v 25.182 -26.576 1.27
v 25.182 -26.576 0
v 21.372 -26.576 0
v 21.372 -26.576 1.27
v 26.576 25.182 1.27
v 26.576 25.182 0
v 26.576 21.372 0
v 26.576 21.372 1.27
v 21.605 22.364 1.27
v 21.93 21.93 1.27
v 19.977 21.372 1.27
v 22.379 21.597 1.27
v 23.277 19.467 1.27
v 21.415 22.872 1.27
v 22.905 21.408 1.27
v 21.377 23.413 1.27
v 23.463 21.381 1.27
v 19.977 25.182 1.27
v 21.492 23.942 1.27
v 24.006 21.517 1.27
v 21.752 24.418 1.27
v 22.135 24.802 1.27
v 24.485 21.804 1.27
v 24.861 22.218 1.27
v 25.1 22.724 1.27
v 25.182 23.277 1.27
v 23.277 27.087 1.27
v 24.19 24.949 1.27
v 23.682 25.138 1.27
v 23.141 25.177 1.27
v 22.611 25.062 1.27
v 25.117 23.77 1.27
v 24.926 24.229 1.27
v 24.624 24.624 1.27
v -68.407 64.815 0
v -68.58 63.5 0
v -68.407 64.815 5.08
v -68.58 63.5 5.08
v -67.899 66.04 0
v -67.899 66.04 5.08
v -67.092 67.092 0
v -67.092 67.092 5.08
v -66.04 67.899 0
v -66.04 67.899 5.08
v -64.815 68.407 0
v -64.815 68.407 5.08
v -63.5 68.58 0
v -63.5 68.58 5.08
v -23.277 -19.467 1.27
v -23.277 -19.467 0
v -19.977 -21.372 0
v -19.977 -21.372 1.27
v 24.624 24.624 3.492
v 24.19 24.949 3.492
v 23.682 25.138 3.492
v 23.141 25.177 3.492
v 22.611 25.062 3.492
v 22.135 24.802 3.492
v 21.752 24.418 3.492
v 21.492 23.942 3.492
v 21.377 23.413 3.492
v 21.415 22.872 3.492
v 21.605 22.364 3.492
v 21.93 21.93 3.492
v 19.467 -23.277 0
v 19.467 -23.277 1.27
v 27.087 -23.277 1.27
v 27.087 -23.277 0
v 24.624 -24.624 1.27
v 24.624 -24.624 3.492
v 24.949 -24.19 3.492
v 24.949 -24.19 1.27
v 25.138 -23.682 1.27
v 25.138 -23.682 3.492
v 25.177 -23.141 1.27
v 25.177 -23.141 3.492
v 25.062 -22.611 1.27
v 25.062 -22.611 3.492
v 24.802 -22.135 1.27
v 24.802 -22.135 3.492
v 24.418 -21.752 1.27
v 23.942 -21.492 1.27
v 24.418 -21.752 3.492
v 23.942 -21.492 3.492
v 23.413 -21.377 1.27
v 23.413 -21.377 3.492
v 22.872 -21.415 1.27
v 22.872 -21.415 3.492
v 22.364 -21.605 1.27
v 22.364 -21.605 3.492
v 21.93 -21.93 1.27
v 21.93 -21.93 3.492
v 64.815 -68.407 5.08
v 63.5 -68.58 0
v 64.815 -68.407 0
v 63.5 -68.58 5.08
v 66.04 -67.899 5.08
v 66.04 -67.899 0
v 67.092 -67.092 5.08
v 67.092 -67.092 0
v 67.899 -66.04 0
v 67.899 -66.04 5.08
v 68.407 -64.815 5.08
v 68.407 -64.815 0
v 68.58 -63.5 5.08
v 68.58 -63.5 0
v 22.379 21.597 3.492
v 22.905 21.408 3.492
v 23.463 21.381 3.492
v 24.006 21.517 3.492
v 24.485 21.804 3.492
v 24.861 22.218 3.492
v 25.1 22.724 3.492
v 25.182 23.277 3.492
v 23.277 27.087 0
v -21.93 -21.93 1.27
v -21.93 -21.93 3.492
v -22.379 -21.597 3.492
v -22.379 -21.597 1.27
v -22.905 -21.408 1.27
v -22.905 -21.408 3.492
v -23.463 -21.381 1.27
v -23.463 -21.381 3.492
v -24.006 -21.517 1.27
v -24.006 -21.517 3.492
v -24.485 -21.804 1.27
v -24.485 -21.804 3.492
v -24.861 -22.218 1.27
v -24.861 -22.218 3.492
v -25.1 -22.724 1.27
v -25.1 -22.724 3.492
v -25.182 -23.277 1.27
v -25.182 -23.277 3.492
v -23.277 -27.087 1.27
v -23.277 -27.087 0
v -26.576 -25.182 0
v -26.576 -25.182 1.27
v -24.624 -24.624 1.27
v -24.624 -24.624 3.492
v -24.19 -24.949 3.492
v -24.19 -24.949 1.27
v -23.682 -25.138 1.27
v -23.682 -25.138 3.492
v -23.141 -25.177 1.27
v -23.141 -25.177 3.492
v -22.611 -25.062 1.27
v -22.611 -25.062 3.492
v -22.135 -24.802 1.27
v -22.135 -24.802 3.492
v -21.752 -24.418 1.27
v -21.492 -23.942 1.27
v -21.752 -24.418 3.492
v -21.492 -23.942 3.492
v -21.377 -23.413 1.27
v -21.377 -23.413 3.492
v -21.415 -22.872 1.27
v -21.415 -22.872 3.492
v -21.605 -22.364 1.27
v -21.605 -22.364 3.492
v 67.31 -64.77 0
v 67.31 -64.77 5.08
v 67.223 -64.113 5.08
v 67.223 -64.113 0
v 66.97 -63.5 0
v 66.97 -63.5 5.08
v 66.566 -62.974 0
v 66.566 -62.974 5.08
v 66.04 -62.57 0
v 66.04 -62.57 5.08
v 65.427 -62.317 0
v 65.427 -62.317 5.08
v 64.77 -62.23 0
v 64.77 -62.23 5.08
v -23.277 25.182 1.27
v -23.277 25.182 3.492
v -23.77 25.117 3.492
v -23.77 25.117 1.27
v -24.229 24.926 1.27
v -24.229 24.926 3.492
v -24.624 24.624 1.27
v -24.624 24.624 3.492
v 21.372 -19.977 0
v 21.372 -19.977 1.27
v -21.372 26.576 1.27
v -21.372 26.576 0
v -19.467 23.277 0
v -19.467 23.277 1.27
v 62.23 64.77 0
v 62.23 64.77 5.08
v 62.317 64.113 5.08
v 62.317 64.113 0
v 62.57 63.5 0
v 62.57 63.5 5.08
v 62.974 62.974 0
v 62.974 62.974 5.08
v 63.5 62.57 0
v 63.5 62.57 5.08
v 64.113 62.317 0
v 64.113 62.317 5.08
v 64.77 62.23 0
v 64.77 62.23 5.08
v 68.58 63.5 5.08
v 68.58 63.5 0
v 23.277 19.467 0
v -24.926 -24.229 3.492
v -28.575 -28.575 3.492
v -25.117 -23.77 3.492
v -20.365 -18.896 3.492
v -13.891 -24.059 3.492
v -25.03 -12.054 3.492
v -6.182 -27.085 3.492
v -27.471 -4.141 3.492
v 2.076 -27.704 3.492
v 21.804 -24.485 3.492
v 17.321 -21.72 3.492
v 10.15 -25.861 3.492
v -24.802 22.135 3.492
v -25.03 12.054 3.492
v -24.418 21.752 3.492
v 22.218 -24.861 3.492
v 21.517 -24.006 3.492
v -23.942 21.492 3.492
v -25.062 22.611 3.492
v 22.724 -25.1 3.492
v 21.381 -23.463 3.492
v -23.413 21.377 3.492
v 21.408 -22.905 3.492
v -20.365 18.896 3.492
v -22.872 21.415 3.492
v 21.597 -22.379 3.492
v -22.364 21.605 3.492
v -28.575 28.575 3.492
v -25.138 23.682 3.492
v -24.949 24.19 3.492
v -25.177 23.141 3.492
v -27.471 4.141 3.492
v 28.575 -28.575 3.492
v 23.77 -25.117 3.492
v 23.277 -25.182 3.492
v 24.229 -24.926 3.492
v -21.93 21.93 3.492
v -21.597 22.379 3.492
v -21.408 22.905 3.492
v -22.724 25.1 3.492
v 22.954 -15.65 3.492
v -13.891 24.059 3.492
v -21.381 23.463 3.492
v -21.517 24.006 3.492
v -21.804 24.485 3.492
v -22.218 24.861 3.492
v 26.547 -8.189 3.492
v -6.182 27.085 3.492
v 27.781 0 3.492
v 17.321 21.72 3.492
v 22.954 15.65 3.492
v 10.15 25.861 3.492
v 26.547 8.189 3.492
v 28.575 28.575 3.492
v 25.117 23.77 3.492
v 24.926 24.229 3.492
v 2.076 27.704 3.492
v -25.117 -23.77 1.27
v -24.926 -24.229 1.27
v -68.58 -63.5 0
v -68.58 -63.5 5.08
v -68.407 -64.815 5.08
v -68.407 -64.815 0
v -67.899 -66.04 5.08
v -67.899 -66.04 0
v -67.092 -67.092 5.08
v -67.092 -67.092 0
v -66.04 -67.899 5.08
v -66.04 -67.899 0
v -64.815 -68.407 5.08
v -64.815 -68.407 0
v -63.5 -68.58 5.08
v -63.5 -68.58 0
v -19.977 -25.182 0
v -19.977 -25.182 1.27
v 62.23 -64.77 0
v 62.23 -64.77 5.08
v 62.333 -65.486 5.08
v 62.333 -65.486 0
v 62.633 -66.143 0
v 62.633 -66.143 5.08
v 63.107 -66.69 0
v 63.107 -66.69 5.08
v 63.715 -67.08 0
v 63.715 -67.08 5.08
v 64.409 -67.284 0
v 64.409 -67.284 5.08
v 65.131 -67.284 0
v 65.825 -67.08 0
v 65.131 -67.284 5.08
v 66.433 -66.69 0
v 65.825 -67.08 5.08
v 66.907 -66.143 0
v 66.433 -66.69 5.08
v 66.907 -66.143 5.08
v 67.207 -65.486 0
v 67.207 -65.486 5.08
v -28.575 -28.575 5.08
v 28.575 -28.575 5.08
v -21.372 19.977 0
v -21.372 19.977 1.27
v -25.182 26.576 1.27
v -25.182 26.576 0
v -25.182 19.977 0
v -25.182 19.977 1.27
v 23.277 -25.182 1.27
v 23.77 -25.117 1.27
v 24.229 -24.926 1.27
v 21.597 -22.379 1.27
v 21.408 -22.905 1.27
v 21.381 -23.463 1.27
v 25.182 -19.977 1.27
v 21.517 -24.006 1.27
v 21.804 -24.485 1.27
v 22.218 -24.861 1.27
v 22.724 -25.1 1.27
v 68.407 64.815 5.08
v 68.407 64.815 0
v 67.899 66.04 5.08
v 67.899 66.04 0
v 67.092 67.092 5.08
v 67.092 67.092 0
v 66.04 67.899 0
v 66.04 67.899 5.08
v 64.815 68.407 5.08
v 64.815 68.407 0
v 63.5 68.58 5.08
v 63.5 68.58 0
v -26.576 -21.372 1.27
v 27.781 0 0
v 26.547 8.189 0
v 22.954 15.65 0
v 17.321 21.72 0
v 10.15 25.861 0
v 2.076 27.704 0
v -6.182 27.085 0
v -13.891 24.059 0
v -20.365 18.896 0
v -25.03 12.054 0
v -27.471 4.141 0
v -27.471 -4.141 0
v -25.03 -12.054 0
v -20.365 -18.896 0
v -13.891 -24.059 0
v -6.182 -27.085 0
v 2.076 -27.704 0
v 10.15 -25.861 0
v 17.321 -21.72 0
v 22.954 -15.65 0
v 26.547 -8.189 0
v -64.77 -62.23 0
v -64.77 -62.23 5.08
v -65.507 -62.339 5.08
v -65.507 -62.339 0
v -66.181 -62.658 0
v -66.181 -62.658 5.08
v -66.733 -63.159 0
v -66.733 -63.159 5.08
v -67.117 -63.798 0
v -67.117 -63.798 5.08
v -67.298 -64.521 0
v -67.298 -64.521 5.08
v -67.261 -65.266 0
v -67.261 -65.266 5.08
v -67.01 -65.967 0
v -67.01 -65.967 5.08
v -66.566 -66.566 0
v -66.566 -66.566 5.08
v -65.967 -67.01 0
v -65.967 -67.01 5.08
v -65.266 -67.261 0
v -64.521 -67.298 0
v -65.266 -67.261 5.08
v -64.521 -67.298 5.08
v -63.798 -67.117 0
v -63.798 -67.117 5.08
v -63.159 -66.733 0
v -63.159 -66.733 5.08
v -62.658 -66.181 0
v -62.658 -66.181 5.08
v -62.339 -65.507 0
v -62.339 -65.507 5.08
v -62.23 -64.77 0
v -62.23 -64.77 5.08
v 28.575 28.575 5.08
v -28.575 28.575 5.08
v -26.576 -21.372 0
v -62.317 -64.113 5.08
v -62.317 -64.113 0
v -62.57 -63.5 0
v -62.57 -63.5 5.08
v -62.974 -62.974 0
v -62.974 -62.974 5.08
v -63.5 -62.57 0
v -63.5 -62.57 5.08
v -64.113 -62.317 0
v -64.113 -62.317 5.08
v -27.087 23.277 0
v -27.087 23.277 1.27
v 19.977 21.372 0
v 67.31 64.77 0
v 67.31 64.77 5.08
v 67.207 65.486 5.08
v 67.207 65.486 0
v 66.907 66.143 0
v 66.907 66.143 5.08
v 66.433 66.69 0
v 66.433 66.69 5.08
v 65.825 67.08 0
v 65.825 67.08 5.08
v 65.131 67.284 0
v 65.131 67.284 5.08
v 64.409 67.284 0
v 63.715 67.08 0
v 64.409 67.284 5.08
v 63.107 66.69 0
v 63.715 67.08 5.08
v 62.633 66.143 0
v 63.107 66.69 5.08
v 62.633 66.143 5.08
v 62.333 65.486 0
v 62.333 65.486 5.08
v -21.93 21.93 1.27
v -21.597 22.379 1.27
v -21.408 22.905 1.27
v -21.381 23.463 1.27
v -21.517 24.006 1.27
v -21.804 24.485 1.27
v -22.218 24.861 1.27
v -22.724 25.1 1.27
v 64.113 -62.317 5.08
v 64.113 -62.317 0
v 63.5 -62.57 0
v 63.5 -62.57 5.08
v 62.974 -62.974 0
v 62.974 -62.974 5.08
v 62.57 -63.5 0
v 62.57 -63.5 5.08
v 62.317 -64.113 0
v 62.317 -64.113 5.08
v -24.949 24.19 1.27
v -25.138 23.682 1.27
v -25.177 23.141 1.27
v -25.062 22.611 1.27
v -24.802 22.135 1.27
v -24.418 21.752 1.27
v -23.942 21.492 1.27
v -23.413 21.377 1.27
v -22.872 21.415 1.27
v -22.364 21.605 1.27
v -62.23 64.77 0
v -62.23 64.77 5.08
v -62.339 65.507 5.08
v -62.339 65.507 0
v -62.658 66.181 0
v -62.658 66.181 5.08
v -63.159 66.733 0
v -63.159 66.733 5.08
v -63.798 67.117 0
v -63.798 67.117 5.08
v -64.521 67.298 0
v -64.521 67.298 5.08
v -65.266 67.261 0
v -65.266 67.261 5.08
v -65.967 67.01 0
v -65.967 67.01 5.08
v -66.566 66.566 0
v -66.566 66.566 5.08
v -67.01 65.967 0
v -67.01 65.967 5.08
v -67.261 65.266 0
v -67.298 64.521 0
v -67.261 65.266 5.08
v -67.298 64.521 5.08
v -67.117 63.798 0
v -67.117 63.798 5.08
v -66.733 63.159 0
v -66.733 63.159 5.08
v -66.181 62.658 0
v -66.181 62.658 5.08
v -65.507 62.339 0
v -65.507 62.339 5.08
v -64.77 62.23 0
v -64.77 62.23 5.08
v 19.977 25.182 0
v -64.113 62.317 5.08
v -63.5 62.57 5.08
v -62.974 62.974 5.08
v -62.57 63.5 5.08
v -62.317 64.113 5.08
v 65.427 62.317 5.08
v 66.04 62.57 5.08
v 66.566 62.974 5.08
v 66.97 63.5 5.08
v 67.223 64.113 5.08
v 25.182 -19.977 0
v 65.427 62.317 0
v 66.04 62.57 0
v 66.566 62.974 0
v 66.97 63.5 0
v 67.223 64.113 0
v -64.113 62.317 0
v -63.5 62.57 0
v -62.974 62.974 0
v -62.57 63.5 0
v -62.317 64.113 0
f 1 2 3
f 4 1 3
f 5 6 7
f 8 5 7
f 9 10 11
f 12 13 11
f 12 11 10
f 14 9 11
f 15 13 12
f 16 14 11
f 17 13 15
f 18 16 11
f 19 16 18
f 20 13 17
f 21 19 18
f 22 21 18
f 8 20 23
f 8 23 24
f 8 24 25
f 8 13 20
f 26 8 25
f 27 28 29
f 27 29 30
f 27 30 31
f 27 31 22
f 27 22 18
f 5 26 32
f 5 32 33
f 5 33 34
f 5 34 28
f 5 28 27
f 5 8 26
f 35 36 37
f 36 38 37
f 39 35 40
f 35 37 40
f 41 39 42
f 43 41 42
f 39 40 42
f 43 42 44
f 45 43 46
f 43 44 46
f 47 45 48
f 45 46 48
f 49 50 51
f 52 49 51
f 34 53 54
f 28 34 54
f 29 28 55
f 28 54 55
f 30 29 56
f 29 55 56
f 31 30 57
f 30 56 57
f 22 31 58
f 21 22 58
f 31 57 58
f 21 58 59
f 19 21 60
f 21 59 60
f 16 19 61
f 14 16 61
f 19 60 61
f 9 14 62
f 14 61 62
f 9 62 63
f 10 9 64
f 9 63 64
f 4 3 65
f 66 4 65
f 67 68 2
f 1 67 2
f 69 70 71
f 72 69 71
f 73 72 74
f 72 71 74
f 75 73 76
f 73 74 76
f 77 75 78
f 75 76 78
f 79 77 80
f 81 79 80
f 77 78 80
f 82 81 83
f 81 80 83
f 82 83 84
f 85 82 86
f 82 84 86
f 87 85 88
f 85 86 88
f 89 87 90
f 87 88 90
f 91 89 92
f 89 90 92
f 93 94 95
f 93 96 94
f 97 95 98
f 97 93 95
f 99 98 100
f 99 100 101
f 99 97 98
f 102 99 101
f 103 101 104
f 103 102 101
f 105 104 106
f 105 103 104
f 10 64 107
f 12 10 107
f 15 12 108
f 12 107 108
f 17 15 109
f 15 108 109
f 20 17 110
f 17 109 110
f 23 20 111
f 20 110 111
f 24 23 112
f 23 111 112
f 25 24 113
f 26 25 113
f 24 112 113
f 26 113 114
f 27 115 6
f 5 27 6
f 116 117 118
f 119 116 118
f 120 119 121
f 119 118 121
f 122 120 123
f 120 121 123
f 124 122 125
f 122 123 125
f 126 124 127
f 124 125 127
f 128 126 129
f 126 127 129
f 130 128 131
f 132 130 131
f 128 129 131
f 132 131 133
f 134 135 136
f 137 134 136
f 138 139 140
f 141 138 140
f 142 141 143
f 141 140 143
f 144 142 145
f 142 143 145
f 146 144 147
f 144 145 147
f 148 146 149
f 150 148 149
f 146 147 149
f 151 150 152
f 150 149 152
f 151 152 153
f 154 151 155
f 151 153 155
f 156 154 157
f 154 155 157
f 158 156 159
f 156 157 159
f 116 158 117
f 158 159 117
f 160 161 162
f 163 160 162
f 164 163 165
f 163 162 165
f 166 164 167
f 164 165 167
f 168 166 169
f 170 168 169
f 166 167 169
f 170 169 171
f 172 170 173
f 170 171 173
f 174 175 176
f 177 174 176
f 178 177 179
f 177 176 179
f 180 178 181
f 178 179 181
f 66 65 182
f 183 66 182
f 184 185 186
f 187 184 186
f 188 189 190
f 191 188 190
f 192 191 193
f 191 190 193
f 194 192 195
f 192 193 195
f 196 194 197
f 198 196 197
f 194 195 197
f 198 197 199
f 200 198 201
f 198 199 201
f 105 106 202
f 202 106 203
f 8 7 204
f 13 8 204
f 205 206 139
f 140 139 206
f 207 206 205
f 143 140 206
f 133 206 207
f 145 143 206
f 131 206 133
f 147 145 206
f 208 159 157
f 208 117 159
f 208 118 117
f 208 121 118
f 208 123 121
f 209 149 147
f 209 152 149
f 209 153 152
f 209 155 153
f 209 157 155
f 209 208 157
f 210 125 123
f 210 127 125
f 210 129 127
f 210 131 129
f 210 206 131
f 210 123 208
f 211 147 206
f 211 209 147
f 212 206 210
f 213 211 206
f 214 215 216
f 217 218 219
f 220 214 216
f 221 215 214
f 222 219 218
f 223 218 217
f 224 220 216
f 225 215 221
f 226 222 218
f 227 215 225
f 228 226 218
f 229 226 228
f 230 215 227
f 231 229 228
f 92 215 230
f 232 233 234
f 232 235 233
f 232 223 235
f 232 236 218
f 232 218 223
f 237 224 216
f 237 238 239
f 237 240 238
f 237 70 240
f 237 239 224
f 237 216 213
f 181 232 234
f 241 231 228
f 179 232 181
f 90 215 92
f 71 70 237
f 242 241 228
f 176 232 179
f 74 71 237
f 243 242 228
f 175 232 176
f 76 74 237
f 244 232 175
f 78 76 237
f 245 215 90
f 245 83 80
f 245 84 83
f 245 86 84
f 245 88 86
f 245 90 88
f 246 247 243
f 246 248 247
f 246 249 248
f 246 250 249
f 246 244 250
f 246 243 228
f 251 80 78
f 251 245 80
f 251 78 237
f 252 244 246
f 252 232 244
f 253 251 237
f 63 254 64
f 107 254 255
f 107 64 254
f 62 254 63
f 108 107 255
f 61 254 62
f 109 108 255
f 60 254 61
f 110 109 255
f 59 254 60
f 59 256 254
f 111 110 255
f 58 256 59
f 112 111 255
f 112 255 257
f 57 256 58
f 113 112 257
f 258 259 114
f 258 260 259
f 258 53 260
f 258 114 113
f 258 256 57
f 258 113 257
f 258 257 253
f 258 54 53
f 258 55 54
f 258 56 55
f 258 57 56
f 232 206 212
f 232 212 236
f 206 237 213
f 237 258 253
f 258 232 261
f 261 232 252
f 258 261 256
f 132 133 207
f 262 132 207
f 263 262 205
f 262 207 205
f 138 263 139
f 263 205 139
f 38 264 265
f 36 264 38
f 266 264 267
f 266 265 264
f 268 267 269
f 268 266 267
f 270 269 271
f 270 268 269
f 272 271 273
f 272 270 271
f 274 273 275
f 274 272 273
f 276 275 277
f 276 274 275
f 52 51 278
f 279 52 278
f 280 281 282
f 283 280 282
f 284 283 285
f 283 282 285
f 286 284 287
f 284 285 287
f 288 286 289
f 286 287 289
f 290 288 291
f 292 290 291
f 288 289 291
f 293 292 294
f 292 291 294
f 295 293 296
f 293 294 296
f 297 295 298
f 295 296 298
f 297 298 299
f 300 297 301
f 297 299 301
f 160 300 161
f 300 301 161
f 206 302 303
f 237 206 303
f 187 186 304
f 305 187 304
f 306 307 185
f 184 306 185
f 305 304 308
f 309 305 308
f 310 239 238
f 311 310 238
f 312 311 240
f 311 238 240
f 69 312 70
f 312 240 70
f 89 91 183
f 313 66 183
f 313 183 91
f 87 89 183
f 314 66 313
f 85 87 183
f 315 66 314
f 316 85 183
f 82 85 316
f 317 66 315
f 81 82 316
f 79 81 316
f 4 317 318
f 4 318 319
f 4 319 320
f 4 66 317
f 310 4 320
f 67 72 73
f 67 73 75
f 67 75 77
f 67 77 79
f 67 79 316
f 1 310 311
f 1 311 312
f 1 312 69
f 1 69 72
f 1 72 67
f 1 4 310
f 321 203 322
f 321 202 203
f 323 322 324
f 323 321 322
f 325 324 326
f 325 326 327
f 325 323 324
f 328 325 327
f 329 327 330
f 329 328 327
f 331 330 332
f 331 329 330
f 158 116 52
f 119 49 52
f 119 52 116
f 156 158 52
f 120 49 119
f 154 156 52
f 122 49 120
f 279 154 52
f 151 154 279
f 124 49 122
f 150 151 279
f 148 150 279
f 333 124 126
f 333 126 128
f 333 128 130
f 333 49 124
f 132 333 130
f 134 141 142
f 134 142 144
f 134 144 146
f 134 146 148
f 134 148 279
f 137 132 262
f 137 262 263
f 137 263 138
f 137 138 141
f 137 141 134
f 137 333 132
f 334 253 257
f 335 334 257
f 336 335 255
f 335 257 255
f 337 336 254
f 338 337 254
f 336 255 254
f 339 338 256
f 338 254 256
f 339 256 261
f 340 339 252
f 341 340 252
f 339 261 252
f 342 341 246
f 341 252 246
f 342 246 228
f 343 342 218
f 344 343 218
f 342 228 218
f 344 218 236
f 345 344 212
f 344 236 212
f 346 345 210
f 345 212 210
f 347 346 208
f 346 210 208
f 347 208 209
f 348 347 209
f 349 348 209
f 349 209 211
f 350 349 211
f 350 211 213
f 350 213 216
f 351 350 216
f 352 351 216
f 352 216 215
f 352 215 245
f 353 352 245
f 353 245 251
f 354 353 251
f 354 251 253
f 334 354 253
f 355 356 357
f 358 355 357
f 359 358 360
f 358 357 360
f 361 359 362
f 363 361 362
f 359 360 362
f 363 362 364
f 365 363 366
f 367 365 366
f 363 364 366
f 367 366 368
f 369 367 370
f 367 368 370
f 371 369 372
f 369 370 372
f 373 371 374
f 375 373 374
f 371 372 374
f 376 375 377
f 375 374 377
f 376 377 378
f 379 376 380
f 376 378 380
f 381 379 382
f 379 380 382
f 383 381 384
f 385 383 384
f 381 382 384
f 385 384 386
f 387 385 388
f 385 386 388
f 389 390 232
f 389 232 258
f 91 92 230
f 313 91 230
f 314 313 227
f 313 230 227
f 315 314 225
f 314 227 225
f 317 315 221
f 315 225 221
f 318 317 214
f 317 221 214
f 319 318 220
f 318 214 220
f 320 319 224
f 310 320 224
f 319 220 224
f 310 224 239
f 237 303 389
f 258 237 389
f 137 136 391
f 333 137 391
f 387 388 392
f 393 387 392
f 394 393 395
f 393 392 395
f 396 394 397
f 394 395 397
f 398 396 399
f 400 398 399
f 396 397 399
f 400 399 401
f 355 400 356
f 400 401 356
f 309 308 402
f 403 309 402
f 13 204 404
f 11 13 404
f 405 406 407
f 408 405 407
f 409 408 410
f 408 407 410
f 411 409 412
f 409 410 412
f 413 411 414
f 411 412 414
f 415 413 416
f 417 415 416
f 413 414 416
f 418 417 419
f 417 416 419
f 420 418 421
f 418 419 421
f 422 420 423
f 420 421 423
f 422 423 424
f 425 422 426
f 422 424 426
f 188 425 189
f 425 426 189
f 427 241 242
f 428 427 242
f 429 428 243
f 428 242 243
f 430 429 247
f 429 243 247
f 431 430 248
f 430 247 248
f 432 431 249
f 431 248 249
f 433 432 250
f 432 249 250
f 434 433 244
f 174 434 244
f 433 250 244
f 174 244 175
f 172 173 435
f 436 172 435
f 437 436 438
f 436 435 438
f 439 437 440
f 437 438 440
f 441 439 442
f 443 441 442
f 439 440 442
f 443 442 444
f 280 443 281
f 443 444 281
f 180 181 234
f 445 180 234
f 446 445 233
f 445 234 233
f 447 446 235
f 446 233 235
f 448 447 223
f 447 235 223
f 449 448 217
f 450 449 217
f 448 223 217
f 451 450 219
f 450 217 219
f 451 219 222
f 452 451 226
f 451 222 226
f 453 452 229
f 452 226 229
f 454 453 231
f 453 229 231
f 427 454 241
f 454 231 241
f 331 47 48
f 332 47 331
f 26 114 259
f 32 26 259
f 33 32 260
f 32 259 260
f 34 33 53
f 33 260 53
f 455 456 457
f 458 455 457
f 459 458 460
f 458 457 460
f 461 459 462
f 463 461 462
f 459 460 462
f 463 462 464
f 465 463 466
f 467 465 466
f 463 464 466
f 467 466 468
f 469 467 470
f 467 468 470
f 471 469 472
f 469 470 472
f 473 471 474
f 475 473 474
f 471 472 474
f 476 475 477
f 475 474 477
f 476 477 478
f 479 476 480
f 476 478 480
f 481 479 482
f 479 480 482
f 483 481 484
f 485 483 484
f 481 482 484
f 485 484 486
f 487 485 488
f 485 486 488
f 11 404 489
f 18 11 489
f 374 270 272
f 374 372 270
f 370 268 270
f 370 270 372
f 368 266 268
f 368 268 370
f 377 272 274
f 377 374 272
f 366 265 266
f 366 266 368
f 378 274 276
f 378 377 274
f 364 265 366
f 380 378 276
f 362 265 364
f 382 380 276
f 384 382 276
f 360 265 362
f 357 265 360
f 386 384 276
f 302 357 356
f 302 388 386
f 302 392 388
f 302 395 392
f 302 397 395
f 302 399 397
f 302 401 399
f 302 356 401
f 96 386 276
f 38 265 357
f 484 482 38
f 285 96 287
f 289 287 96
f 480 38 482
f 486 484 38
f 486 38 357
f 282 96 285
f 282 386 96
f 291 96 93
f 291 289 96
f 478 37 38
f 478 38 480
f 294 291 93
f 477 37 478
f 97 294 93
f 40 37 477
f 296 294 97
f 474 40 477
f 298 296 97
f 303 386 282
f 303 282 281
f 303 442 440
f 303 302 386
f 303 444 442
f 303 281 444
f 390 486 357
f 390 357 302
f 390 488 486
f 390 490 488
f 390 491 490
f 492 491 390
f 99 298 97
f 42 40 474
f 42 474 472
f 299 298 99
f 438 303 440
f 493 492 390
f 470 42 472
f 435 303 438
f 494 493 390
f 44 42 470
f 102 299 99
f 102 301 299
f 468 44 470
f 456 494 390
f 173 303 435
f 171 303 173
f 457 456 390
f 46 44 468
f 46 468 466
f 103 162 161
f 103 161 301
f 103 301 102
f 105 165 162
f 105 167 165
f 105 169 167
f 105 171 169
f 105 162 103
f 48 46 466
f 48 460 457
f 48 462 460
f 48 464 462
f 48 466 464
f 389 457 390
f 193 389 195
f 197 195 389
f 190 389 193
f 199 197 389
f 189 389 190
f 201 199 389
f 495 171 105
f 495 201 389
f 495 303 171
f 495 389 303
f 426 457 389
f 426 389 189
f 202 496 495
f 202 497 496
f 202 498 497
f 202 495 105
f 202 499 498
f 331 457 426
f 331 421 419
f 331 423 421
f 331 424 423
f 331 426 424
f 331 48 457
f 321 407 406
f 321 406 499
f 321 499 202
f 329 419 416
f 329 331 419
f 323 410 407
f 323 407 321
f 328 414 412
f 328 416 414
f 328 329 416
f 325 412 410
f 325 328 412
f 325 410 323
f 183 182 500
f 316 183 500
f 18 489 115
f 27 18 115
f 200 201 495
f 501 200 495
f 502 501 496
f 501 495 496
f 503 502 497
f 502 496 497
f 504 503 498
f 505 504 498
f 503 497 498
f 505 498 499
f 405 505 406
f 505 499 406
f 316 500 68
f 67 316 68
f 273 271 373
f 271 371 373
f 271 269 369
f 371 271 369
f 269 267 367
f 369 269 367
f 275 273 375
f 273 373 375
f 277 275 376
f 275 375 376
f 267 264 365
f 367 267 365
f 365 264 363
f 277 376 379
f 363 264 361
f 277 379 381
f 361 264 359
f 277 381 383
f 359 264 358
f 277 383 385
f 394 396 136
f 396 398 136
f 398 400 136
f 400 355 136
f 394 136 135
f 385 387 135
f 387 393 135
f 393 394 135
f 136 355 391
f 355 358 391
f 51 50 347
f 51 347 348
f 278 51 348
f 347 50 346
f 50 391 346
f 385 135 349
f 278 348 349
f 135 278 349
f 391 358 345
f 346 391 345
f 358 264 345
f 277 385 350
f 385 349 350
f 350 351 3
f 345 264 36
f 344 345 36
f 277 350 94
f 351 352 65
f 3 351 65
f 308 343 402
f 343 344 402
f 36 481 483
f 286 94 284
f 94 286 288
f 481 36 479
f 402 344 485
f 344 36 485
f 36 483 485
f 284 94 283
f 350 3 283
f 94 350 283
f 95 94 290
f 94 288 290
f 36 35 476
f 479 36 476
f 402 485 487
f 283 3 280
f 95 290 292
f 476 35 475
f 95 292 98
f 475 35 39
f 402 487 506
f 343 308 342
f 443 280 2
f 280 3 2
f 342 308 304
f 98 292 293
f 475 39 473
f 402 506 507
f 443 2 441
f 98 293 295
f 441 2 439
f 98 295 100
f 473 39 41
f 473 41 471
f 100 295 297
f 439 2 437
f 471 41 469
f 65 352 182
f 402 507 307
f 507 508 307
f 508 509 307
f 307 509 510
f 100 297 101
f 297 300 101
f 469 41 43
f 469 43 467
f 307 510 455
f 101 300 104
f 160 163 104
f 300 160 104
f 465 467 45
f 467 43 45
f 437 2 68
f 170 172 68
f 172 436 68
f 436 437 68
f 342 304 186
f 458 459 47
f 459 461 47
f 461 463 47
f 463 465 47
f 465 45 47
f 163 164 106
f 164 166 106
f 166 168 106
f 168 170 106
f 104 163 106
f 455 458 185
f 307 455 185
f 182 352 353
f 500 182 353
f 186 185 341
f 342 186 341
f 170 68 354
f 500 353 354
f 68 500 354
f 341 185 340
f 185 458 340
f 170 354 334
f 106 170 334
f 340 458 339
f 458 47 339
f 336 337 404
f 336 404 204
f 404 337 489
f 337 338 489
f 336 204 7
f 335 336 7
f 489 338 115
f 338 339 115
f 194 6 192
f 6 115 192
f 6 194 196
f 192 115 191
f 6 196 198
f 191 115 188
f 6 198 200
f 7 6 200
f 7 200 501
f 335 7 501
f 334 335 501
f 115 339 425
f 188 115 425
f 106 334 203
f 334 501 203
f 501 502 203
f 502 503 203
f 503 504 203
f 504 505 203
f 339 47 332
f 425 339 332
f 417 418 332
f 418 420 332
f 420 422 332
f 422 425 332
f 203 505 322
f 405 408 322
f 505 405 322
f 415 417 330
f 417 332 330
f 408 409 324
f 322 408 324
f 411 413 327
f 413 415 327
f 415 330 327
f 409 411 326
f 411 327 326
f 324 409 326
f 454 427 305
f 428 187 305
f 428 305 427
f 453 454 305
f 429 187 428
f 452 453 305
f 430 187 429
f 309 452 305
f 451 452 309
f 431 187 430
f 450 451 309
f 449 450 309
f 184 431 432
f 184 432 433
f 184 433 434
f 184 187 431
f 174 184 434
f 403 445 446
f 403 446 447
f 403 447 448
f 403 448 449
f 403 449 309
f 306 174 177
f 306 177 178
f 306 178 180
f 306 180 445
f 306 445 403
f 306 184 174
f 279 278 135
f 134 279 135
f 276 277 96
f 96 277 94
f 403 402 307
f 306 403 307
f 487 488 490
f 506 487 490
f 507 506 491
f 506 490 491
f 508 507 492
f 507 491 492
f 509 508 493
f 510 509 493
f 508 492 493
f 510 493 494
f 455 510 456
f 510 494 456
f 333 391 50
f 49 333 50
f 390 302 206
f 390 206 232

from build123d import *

# Parameters (mm, degrees)
F0_W             = 137.16
F0_H             = 137.16
F1_DEPTH         = 5.08
F2_R             = 5.08
F3_R             = 27.78125
F4_DEPTH         = 5.08
F5_W             = 57.15
F5_H             = 57.15
F6_DEPTH         = 1.5875
F8_DEPTH         = 3.4925
F8_COPIES_COUNT  = 4
F11_DEPTH        = 1.27
F11_COPIES_COUNT = 4
F13_DEPTH        = 5.08


# Not quite as in the source:
# - a pattern or mirror of a feature is missing from the dataset's text; its kind, count and spacing are read off the source's solid


with BuildPart() as f1:
    # F0 (on Top) → F1 (new body)
    with BuildSketch(Plane.XY):
        Rectangle(F0_W, F0_H)
    extrude(amount=F1_DEPTH)

    # F2
    f2_edges = [f1.edges().sort_by_distance(p)[0] for p in [
        (-68.58, -68.58, 2.54),
        (68.58, -68.58, 2.54),
        (68.58, 68.58, 2.54),
        (-68.58, 68.58, 2.54),
    ]]
    fillet(f2_edges, radius=F2_R)

    # F3 (on face) → F4 (cut, through all)
    with BuildSketch(Plane.XY.offset(5.08)):
        Circle(F3_R)
    extrude(amount=-F4_DEPTH, mode=Mode.SUBTRACT)

    # F5 (on face) → F6 (cut)
    with BuildSketch(Plane.XY.offset(5.08)):
        Rectangle(F5_W, F5_H)
    extrude(amount=-F6_DEPTH, mode=Mode.SUBTRACT)

    # F7 (on face) → F8 (cut, through all)
    with BuildSketch(Plane.XY.offset(3.4925)):
        with BuildLine():
            Line((21.9296104704, 21.9296104704), (24.6236873067, 24.6236873067))
            ThreePointArc((24.6236873067, 24.6236873067), (21.9296104704, 24.6236873067), (21.9296104704, 21.9296104704))
        make_face()
        with BuildLine():
            ThreePointArc((25.1816488886, 23.2766488886), (25.036639398, 24.0056608272), (24.6236873067, 24.6236873067))
            Line((24.6236873067, 24.6236873067), (21.9296104704, 21.9296104704))
            ThreePointArc((21.9296104704, 21.9296104704), (24.0056608272, 21.5166583791), (25.1816488886, 23.2766488886))
        make_face()
    f8 = extrude(amount=-F8_DEPTH, mode=Mode.SUBTRACT)

    # F8_copies: F8 ×4 about axis
    f8_copies_axis = Axis((0, 0, 0), (0, 0, 1))
    for i in range(1, F8_COPIES_COUNT):
        add(f8.rotate(f8_copies_axis, i * 360 / F8_COPIES_COUNT), mode=Mode.SUBTRACT)

    # F10 (on face) → F11 (cut)
    with BuildSketch(Plane(origin=(0, 0, 0), x_dir=(1, 0, 0), z_dir=(0, 0, -1))):
        Polygon((27.0866488886, 23.2766488886), (25.1816488886, 26.576205677), (21.3716488886, 26.576205677), (19.4666488886, 23.2766488886), (21.3716488886, 19.9770921002), (25.1816488886, 19.9770921002), align=None)
    f11 = extrude(amount=-F11_DEPTH, mode=Mode.SUBTRACT)

    # F11_copies: F11 ×4 about axis
    f11_copies_axis = Axis((0, 0, 0), (0, 0, 1))
    for i in range(1, F11_COPIES_COUNT):
        add(f11.rotate(f11_copies_axis, i * 360 / F11_COPIES_COUNT), mode=Mode.SUBTRACT)

    # F12 (on face) → F13 (cut, through all)
    with BuildSketch(Plane.XY.offset(5.08)):
        with BuildLine():
            Line((-64.77, 64.77), (-62.23, 64.77))
            ThreePointArc((-62.23, 64.77), (-66.5660512242, 66.5660512242), (-64.77, 62.23))
            Line((-64.77, 62.23), (-64.77, 64.77))
        make_face()
        with BuildLine():
            ThreePointArc((-64.77, 62.23), (-62.9739487758, 62.9739487758), (-62.23, 64.77))
            Line((-62.23, 64.77), (-64.77, 64.77))
            Line((-64.77, 64.77), (-64.77, 62.23))
        make_face()
        with BuildLine():
            Line((-64.77, -64.77), (-64.77, -62.23))
            ThreePointArc((-64.77, -62.23), (-66.5660512242, -66.5660512242), (-62.23, -64.77))
            Line((-62.23, -64.77), (-64.77, -64.77))
        make_face()
        with BuildLine():
            ThreePointArc((-62.23, -64.77), (-62.9739487758, -62.9739487758), (-64.77, -62.23))
            Line((-64.77, -62.23), (-64.77, -64.77))
            Line((-64.77, -64.77), (-62.23, -64.77))
        make_face()
        with BuildLine():
            ThreePointArc((67.31, -64.77), (66.5660512242, -62.9739487758), (64.77, -62.23))
            Line((64.77, -62.23), (64.77, -64.77))
            Line((64.77, -64.77), (62.23, -64.77))
            ThreePointArc((62.23, -64.77), (64.77, -67.31), (67.31, -64.77))
        make_face()
        with BuildLine():
            Line((64.77, -64.77), (64.77, -62.23))
            ThreePointArc((64.77, -62.23), (62.9739487758, -62.9739487758), (62.23, -64.77))
            Line((62.23, -64.77), (64.77, -64.77))
        make_face()
        with BuildLine():
            Line((64.77, 64.77), (62.23, 64.77))
            ThreePointArc((62.23, 64.77), (62.9739487758, 62.9739487758), (64.77, 62.23))
            Line((64.77, 62.23), (64.77, 64.77))
        make_face()
        with BuildLine():
            ThreePointArc((67.31, 64.77), (64.77, 67.31), (62.23, 64.77))
            Line((62.23, 64.77), (64.77, 64.77))
            Line((64.77, 64.77), (64.77, 62.23))
            ThreePointArc((64.77, 62.23), (66.5660512242, 62.9739487758), (67.31, 64.77))
        make_face()
    extrude(amount=-F13_DEPTH, mode=Mode.SUBTRACT)


solid = f1.part
